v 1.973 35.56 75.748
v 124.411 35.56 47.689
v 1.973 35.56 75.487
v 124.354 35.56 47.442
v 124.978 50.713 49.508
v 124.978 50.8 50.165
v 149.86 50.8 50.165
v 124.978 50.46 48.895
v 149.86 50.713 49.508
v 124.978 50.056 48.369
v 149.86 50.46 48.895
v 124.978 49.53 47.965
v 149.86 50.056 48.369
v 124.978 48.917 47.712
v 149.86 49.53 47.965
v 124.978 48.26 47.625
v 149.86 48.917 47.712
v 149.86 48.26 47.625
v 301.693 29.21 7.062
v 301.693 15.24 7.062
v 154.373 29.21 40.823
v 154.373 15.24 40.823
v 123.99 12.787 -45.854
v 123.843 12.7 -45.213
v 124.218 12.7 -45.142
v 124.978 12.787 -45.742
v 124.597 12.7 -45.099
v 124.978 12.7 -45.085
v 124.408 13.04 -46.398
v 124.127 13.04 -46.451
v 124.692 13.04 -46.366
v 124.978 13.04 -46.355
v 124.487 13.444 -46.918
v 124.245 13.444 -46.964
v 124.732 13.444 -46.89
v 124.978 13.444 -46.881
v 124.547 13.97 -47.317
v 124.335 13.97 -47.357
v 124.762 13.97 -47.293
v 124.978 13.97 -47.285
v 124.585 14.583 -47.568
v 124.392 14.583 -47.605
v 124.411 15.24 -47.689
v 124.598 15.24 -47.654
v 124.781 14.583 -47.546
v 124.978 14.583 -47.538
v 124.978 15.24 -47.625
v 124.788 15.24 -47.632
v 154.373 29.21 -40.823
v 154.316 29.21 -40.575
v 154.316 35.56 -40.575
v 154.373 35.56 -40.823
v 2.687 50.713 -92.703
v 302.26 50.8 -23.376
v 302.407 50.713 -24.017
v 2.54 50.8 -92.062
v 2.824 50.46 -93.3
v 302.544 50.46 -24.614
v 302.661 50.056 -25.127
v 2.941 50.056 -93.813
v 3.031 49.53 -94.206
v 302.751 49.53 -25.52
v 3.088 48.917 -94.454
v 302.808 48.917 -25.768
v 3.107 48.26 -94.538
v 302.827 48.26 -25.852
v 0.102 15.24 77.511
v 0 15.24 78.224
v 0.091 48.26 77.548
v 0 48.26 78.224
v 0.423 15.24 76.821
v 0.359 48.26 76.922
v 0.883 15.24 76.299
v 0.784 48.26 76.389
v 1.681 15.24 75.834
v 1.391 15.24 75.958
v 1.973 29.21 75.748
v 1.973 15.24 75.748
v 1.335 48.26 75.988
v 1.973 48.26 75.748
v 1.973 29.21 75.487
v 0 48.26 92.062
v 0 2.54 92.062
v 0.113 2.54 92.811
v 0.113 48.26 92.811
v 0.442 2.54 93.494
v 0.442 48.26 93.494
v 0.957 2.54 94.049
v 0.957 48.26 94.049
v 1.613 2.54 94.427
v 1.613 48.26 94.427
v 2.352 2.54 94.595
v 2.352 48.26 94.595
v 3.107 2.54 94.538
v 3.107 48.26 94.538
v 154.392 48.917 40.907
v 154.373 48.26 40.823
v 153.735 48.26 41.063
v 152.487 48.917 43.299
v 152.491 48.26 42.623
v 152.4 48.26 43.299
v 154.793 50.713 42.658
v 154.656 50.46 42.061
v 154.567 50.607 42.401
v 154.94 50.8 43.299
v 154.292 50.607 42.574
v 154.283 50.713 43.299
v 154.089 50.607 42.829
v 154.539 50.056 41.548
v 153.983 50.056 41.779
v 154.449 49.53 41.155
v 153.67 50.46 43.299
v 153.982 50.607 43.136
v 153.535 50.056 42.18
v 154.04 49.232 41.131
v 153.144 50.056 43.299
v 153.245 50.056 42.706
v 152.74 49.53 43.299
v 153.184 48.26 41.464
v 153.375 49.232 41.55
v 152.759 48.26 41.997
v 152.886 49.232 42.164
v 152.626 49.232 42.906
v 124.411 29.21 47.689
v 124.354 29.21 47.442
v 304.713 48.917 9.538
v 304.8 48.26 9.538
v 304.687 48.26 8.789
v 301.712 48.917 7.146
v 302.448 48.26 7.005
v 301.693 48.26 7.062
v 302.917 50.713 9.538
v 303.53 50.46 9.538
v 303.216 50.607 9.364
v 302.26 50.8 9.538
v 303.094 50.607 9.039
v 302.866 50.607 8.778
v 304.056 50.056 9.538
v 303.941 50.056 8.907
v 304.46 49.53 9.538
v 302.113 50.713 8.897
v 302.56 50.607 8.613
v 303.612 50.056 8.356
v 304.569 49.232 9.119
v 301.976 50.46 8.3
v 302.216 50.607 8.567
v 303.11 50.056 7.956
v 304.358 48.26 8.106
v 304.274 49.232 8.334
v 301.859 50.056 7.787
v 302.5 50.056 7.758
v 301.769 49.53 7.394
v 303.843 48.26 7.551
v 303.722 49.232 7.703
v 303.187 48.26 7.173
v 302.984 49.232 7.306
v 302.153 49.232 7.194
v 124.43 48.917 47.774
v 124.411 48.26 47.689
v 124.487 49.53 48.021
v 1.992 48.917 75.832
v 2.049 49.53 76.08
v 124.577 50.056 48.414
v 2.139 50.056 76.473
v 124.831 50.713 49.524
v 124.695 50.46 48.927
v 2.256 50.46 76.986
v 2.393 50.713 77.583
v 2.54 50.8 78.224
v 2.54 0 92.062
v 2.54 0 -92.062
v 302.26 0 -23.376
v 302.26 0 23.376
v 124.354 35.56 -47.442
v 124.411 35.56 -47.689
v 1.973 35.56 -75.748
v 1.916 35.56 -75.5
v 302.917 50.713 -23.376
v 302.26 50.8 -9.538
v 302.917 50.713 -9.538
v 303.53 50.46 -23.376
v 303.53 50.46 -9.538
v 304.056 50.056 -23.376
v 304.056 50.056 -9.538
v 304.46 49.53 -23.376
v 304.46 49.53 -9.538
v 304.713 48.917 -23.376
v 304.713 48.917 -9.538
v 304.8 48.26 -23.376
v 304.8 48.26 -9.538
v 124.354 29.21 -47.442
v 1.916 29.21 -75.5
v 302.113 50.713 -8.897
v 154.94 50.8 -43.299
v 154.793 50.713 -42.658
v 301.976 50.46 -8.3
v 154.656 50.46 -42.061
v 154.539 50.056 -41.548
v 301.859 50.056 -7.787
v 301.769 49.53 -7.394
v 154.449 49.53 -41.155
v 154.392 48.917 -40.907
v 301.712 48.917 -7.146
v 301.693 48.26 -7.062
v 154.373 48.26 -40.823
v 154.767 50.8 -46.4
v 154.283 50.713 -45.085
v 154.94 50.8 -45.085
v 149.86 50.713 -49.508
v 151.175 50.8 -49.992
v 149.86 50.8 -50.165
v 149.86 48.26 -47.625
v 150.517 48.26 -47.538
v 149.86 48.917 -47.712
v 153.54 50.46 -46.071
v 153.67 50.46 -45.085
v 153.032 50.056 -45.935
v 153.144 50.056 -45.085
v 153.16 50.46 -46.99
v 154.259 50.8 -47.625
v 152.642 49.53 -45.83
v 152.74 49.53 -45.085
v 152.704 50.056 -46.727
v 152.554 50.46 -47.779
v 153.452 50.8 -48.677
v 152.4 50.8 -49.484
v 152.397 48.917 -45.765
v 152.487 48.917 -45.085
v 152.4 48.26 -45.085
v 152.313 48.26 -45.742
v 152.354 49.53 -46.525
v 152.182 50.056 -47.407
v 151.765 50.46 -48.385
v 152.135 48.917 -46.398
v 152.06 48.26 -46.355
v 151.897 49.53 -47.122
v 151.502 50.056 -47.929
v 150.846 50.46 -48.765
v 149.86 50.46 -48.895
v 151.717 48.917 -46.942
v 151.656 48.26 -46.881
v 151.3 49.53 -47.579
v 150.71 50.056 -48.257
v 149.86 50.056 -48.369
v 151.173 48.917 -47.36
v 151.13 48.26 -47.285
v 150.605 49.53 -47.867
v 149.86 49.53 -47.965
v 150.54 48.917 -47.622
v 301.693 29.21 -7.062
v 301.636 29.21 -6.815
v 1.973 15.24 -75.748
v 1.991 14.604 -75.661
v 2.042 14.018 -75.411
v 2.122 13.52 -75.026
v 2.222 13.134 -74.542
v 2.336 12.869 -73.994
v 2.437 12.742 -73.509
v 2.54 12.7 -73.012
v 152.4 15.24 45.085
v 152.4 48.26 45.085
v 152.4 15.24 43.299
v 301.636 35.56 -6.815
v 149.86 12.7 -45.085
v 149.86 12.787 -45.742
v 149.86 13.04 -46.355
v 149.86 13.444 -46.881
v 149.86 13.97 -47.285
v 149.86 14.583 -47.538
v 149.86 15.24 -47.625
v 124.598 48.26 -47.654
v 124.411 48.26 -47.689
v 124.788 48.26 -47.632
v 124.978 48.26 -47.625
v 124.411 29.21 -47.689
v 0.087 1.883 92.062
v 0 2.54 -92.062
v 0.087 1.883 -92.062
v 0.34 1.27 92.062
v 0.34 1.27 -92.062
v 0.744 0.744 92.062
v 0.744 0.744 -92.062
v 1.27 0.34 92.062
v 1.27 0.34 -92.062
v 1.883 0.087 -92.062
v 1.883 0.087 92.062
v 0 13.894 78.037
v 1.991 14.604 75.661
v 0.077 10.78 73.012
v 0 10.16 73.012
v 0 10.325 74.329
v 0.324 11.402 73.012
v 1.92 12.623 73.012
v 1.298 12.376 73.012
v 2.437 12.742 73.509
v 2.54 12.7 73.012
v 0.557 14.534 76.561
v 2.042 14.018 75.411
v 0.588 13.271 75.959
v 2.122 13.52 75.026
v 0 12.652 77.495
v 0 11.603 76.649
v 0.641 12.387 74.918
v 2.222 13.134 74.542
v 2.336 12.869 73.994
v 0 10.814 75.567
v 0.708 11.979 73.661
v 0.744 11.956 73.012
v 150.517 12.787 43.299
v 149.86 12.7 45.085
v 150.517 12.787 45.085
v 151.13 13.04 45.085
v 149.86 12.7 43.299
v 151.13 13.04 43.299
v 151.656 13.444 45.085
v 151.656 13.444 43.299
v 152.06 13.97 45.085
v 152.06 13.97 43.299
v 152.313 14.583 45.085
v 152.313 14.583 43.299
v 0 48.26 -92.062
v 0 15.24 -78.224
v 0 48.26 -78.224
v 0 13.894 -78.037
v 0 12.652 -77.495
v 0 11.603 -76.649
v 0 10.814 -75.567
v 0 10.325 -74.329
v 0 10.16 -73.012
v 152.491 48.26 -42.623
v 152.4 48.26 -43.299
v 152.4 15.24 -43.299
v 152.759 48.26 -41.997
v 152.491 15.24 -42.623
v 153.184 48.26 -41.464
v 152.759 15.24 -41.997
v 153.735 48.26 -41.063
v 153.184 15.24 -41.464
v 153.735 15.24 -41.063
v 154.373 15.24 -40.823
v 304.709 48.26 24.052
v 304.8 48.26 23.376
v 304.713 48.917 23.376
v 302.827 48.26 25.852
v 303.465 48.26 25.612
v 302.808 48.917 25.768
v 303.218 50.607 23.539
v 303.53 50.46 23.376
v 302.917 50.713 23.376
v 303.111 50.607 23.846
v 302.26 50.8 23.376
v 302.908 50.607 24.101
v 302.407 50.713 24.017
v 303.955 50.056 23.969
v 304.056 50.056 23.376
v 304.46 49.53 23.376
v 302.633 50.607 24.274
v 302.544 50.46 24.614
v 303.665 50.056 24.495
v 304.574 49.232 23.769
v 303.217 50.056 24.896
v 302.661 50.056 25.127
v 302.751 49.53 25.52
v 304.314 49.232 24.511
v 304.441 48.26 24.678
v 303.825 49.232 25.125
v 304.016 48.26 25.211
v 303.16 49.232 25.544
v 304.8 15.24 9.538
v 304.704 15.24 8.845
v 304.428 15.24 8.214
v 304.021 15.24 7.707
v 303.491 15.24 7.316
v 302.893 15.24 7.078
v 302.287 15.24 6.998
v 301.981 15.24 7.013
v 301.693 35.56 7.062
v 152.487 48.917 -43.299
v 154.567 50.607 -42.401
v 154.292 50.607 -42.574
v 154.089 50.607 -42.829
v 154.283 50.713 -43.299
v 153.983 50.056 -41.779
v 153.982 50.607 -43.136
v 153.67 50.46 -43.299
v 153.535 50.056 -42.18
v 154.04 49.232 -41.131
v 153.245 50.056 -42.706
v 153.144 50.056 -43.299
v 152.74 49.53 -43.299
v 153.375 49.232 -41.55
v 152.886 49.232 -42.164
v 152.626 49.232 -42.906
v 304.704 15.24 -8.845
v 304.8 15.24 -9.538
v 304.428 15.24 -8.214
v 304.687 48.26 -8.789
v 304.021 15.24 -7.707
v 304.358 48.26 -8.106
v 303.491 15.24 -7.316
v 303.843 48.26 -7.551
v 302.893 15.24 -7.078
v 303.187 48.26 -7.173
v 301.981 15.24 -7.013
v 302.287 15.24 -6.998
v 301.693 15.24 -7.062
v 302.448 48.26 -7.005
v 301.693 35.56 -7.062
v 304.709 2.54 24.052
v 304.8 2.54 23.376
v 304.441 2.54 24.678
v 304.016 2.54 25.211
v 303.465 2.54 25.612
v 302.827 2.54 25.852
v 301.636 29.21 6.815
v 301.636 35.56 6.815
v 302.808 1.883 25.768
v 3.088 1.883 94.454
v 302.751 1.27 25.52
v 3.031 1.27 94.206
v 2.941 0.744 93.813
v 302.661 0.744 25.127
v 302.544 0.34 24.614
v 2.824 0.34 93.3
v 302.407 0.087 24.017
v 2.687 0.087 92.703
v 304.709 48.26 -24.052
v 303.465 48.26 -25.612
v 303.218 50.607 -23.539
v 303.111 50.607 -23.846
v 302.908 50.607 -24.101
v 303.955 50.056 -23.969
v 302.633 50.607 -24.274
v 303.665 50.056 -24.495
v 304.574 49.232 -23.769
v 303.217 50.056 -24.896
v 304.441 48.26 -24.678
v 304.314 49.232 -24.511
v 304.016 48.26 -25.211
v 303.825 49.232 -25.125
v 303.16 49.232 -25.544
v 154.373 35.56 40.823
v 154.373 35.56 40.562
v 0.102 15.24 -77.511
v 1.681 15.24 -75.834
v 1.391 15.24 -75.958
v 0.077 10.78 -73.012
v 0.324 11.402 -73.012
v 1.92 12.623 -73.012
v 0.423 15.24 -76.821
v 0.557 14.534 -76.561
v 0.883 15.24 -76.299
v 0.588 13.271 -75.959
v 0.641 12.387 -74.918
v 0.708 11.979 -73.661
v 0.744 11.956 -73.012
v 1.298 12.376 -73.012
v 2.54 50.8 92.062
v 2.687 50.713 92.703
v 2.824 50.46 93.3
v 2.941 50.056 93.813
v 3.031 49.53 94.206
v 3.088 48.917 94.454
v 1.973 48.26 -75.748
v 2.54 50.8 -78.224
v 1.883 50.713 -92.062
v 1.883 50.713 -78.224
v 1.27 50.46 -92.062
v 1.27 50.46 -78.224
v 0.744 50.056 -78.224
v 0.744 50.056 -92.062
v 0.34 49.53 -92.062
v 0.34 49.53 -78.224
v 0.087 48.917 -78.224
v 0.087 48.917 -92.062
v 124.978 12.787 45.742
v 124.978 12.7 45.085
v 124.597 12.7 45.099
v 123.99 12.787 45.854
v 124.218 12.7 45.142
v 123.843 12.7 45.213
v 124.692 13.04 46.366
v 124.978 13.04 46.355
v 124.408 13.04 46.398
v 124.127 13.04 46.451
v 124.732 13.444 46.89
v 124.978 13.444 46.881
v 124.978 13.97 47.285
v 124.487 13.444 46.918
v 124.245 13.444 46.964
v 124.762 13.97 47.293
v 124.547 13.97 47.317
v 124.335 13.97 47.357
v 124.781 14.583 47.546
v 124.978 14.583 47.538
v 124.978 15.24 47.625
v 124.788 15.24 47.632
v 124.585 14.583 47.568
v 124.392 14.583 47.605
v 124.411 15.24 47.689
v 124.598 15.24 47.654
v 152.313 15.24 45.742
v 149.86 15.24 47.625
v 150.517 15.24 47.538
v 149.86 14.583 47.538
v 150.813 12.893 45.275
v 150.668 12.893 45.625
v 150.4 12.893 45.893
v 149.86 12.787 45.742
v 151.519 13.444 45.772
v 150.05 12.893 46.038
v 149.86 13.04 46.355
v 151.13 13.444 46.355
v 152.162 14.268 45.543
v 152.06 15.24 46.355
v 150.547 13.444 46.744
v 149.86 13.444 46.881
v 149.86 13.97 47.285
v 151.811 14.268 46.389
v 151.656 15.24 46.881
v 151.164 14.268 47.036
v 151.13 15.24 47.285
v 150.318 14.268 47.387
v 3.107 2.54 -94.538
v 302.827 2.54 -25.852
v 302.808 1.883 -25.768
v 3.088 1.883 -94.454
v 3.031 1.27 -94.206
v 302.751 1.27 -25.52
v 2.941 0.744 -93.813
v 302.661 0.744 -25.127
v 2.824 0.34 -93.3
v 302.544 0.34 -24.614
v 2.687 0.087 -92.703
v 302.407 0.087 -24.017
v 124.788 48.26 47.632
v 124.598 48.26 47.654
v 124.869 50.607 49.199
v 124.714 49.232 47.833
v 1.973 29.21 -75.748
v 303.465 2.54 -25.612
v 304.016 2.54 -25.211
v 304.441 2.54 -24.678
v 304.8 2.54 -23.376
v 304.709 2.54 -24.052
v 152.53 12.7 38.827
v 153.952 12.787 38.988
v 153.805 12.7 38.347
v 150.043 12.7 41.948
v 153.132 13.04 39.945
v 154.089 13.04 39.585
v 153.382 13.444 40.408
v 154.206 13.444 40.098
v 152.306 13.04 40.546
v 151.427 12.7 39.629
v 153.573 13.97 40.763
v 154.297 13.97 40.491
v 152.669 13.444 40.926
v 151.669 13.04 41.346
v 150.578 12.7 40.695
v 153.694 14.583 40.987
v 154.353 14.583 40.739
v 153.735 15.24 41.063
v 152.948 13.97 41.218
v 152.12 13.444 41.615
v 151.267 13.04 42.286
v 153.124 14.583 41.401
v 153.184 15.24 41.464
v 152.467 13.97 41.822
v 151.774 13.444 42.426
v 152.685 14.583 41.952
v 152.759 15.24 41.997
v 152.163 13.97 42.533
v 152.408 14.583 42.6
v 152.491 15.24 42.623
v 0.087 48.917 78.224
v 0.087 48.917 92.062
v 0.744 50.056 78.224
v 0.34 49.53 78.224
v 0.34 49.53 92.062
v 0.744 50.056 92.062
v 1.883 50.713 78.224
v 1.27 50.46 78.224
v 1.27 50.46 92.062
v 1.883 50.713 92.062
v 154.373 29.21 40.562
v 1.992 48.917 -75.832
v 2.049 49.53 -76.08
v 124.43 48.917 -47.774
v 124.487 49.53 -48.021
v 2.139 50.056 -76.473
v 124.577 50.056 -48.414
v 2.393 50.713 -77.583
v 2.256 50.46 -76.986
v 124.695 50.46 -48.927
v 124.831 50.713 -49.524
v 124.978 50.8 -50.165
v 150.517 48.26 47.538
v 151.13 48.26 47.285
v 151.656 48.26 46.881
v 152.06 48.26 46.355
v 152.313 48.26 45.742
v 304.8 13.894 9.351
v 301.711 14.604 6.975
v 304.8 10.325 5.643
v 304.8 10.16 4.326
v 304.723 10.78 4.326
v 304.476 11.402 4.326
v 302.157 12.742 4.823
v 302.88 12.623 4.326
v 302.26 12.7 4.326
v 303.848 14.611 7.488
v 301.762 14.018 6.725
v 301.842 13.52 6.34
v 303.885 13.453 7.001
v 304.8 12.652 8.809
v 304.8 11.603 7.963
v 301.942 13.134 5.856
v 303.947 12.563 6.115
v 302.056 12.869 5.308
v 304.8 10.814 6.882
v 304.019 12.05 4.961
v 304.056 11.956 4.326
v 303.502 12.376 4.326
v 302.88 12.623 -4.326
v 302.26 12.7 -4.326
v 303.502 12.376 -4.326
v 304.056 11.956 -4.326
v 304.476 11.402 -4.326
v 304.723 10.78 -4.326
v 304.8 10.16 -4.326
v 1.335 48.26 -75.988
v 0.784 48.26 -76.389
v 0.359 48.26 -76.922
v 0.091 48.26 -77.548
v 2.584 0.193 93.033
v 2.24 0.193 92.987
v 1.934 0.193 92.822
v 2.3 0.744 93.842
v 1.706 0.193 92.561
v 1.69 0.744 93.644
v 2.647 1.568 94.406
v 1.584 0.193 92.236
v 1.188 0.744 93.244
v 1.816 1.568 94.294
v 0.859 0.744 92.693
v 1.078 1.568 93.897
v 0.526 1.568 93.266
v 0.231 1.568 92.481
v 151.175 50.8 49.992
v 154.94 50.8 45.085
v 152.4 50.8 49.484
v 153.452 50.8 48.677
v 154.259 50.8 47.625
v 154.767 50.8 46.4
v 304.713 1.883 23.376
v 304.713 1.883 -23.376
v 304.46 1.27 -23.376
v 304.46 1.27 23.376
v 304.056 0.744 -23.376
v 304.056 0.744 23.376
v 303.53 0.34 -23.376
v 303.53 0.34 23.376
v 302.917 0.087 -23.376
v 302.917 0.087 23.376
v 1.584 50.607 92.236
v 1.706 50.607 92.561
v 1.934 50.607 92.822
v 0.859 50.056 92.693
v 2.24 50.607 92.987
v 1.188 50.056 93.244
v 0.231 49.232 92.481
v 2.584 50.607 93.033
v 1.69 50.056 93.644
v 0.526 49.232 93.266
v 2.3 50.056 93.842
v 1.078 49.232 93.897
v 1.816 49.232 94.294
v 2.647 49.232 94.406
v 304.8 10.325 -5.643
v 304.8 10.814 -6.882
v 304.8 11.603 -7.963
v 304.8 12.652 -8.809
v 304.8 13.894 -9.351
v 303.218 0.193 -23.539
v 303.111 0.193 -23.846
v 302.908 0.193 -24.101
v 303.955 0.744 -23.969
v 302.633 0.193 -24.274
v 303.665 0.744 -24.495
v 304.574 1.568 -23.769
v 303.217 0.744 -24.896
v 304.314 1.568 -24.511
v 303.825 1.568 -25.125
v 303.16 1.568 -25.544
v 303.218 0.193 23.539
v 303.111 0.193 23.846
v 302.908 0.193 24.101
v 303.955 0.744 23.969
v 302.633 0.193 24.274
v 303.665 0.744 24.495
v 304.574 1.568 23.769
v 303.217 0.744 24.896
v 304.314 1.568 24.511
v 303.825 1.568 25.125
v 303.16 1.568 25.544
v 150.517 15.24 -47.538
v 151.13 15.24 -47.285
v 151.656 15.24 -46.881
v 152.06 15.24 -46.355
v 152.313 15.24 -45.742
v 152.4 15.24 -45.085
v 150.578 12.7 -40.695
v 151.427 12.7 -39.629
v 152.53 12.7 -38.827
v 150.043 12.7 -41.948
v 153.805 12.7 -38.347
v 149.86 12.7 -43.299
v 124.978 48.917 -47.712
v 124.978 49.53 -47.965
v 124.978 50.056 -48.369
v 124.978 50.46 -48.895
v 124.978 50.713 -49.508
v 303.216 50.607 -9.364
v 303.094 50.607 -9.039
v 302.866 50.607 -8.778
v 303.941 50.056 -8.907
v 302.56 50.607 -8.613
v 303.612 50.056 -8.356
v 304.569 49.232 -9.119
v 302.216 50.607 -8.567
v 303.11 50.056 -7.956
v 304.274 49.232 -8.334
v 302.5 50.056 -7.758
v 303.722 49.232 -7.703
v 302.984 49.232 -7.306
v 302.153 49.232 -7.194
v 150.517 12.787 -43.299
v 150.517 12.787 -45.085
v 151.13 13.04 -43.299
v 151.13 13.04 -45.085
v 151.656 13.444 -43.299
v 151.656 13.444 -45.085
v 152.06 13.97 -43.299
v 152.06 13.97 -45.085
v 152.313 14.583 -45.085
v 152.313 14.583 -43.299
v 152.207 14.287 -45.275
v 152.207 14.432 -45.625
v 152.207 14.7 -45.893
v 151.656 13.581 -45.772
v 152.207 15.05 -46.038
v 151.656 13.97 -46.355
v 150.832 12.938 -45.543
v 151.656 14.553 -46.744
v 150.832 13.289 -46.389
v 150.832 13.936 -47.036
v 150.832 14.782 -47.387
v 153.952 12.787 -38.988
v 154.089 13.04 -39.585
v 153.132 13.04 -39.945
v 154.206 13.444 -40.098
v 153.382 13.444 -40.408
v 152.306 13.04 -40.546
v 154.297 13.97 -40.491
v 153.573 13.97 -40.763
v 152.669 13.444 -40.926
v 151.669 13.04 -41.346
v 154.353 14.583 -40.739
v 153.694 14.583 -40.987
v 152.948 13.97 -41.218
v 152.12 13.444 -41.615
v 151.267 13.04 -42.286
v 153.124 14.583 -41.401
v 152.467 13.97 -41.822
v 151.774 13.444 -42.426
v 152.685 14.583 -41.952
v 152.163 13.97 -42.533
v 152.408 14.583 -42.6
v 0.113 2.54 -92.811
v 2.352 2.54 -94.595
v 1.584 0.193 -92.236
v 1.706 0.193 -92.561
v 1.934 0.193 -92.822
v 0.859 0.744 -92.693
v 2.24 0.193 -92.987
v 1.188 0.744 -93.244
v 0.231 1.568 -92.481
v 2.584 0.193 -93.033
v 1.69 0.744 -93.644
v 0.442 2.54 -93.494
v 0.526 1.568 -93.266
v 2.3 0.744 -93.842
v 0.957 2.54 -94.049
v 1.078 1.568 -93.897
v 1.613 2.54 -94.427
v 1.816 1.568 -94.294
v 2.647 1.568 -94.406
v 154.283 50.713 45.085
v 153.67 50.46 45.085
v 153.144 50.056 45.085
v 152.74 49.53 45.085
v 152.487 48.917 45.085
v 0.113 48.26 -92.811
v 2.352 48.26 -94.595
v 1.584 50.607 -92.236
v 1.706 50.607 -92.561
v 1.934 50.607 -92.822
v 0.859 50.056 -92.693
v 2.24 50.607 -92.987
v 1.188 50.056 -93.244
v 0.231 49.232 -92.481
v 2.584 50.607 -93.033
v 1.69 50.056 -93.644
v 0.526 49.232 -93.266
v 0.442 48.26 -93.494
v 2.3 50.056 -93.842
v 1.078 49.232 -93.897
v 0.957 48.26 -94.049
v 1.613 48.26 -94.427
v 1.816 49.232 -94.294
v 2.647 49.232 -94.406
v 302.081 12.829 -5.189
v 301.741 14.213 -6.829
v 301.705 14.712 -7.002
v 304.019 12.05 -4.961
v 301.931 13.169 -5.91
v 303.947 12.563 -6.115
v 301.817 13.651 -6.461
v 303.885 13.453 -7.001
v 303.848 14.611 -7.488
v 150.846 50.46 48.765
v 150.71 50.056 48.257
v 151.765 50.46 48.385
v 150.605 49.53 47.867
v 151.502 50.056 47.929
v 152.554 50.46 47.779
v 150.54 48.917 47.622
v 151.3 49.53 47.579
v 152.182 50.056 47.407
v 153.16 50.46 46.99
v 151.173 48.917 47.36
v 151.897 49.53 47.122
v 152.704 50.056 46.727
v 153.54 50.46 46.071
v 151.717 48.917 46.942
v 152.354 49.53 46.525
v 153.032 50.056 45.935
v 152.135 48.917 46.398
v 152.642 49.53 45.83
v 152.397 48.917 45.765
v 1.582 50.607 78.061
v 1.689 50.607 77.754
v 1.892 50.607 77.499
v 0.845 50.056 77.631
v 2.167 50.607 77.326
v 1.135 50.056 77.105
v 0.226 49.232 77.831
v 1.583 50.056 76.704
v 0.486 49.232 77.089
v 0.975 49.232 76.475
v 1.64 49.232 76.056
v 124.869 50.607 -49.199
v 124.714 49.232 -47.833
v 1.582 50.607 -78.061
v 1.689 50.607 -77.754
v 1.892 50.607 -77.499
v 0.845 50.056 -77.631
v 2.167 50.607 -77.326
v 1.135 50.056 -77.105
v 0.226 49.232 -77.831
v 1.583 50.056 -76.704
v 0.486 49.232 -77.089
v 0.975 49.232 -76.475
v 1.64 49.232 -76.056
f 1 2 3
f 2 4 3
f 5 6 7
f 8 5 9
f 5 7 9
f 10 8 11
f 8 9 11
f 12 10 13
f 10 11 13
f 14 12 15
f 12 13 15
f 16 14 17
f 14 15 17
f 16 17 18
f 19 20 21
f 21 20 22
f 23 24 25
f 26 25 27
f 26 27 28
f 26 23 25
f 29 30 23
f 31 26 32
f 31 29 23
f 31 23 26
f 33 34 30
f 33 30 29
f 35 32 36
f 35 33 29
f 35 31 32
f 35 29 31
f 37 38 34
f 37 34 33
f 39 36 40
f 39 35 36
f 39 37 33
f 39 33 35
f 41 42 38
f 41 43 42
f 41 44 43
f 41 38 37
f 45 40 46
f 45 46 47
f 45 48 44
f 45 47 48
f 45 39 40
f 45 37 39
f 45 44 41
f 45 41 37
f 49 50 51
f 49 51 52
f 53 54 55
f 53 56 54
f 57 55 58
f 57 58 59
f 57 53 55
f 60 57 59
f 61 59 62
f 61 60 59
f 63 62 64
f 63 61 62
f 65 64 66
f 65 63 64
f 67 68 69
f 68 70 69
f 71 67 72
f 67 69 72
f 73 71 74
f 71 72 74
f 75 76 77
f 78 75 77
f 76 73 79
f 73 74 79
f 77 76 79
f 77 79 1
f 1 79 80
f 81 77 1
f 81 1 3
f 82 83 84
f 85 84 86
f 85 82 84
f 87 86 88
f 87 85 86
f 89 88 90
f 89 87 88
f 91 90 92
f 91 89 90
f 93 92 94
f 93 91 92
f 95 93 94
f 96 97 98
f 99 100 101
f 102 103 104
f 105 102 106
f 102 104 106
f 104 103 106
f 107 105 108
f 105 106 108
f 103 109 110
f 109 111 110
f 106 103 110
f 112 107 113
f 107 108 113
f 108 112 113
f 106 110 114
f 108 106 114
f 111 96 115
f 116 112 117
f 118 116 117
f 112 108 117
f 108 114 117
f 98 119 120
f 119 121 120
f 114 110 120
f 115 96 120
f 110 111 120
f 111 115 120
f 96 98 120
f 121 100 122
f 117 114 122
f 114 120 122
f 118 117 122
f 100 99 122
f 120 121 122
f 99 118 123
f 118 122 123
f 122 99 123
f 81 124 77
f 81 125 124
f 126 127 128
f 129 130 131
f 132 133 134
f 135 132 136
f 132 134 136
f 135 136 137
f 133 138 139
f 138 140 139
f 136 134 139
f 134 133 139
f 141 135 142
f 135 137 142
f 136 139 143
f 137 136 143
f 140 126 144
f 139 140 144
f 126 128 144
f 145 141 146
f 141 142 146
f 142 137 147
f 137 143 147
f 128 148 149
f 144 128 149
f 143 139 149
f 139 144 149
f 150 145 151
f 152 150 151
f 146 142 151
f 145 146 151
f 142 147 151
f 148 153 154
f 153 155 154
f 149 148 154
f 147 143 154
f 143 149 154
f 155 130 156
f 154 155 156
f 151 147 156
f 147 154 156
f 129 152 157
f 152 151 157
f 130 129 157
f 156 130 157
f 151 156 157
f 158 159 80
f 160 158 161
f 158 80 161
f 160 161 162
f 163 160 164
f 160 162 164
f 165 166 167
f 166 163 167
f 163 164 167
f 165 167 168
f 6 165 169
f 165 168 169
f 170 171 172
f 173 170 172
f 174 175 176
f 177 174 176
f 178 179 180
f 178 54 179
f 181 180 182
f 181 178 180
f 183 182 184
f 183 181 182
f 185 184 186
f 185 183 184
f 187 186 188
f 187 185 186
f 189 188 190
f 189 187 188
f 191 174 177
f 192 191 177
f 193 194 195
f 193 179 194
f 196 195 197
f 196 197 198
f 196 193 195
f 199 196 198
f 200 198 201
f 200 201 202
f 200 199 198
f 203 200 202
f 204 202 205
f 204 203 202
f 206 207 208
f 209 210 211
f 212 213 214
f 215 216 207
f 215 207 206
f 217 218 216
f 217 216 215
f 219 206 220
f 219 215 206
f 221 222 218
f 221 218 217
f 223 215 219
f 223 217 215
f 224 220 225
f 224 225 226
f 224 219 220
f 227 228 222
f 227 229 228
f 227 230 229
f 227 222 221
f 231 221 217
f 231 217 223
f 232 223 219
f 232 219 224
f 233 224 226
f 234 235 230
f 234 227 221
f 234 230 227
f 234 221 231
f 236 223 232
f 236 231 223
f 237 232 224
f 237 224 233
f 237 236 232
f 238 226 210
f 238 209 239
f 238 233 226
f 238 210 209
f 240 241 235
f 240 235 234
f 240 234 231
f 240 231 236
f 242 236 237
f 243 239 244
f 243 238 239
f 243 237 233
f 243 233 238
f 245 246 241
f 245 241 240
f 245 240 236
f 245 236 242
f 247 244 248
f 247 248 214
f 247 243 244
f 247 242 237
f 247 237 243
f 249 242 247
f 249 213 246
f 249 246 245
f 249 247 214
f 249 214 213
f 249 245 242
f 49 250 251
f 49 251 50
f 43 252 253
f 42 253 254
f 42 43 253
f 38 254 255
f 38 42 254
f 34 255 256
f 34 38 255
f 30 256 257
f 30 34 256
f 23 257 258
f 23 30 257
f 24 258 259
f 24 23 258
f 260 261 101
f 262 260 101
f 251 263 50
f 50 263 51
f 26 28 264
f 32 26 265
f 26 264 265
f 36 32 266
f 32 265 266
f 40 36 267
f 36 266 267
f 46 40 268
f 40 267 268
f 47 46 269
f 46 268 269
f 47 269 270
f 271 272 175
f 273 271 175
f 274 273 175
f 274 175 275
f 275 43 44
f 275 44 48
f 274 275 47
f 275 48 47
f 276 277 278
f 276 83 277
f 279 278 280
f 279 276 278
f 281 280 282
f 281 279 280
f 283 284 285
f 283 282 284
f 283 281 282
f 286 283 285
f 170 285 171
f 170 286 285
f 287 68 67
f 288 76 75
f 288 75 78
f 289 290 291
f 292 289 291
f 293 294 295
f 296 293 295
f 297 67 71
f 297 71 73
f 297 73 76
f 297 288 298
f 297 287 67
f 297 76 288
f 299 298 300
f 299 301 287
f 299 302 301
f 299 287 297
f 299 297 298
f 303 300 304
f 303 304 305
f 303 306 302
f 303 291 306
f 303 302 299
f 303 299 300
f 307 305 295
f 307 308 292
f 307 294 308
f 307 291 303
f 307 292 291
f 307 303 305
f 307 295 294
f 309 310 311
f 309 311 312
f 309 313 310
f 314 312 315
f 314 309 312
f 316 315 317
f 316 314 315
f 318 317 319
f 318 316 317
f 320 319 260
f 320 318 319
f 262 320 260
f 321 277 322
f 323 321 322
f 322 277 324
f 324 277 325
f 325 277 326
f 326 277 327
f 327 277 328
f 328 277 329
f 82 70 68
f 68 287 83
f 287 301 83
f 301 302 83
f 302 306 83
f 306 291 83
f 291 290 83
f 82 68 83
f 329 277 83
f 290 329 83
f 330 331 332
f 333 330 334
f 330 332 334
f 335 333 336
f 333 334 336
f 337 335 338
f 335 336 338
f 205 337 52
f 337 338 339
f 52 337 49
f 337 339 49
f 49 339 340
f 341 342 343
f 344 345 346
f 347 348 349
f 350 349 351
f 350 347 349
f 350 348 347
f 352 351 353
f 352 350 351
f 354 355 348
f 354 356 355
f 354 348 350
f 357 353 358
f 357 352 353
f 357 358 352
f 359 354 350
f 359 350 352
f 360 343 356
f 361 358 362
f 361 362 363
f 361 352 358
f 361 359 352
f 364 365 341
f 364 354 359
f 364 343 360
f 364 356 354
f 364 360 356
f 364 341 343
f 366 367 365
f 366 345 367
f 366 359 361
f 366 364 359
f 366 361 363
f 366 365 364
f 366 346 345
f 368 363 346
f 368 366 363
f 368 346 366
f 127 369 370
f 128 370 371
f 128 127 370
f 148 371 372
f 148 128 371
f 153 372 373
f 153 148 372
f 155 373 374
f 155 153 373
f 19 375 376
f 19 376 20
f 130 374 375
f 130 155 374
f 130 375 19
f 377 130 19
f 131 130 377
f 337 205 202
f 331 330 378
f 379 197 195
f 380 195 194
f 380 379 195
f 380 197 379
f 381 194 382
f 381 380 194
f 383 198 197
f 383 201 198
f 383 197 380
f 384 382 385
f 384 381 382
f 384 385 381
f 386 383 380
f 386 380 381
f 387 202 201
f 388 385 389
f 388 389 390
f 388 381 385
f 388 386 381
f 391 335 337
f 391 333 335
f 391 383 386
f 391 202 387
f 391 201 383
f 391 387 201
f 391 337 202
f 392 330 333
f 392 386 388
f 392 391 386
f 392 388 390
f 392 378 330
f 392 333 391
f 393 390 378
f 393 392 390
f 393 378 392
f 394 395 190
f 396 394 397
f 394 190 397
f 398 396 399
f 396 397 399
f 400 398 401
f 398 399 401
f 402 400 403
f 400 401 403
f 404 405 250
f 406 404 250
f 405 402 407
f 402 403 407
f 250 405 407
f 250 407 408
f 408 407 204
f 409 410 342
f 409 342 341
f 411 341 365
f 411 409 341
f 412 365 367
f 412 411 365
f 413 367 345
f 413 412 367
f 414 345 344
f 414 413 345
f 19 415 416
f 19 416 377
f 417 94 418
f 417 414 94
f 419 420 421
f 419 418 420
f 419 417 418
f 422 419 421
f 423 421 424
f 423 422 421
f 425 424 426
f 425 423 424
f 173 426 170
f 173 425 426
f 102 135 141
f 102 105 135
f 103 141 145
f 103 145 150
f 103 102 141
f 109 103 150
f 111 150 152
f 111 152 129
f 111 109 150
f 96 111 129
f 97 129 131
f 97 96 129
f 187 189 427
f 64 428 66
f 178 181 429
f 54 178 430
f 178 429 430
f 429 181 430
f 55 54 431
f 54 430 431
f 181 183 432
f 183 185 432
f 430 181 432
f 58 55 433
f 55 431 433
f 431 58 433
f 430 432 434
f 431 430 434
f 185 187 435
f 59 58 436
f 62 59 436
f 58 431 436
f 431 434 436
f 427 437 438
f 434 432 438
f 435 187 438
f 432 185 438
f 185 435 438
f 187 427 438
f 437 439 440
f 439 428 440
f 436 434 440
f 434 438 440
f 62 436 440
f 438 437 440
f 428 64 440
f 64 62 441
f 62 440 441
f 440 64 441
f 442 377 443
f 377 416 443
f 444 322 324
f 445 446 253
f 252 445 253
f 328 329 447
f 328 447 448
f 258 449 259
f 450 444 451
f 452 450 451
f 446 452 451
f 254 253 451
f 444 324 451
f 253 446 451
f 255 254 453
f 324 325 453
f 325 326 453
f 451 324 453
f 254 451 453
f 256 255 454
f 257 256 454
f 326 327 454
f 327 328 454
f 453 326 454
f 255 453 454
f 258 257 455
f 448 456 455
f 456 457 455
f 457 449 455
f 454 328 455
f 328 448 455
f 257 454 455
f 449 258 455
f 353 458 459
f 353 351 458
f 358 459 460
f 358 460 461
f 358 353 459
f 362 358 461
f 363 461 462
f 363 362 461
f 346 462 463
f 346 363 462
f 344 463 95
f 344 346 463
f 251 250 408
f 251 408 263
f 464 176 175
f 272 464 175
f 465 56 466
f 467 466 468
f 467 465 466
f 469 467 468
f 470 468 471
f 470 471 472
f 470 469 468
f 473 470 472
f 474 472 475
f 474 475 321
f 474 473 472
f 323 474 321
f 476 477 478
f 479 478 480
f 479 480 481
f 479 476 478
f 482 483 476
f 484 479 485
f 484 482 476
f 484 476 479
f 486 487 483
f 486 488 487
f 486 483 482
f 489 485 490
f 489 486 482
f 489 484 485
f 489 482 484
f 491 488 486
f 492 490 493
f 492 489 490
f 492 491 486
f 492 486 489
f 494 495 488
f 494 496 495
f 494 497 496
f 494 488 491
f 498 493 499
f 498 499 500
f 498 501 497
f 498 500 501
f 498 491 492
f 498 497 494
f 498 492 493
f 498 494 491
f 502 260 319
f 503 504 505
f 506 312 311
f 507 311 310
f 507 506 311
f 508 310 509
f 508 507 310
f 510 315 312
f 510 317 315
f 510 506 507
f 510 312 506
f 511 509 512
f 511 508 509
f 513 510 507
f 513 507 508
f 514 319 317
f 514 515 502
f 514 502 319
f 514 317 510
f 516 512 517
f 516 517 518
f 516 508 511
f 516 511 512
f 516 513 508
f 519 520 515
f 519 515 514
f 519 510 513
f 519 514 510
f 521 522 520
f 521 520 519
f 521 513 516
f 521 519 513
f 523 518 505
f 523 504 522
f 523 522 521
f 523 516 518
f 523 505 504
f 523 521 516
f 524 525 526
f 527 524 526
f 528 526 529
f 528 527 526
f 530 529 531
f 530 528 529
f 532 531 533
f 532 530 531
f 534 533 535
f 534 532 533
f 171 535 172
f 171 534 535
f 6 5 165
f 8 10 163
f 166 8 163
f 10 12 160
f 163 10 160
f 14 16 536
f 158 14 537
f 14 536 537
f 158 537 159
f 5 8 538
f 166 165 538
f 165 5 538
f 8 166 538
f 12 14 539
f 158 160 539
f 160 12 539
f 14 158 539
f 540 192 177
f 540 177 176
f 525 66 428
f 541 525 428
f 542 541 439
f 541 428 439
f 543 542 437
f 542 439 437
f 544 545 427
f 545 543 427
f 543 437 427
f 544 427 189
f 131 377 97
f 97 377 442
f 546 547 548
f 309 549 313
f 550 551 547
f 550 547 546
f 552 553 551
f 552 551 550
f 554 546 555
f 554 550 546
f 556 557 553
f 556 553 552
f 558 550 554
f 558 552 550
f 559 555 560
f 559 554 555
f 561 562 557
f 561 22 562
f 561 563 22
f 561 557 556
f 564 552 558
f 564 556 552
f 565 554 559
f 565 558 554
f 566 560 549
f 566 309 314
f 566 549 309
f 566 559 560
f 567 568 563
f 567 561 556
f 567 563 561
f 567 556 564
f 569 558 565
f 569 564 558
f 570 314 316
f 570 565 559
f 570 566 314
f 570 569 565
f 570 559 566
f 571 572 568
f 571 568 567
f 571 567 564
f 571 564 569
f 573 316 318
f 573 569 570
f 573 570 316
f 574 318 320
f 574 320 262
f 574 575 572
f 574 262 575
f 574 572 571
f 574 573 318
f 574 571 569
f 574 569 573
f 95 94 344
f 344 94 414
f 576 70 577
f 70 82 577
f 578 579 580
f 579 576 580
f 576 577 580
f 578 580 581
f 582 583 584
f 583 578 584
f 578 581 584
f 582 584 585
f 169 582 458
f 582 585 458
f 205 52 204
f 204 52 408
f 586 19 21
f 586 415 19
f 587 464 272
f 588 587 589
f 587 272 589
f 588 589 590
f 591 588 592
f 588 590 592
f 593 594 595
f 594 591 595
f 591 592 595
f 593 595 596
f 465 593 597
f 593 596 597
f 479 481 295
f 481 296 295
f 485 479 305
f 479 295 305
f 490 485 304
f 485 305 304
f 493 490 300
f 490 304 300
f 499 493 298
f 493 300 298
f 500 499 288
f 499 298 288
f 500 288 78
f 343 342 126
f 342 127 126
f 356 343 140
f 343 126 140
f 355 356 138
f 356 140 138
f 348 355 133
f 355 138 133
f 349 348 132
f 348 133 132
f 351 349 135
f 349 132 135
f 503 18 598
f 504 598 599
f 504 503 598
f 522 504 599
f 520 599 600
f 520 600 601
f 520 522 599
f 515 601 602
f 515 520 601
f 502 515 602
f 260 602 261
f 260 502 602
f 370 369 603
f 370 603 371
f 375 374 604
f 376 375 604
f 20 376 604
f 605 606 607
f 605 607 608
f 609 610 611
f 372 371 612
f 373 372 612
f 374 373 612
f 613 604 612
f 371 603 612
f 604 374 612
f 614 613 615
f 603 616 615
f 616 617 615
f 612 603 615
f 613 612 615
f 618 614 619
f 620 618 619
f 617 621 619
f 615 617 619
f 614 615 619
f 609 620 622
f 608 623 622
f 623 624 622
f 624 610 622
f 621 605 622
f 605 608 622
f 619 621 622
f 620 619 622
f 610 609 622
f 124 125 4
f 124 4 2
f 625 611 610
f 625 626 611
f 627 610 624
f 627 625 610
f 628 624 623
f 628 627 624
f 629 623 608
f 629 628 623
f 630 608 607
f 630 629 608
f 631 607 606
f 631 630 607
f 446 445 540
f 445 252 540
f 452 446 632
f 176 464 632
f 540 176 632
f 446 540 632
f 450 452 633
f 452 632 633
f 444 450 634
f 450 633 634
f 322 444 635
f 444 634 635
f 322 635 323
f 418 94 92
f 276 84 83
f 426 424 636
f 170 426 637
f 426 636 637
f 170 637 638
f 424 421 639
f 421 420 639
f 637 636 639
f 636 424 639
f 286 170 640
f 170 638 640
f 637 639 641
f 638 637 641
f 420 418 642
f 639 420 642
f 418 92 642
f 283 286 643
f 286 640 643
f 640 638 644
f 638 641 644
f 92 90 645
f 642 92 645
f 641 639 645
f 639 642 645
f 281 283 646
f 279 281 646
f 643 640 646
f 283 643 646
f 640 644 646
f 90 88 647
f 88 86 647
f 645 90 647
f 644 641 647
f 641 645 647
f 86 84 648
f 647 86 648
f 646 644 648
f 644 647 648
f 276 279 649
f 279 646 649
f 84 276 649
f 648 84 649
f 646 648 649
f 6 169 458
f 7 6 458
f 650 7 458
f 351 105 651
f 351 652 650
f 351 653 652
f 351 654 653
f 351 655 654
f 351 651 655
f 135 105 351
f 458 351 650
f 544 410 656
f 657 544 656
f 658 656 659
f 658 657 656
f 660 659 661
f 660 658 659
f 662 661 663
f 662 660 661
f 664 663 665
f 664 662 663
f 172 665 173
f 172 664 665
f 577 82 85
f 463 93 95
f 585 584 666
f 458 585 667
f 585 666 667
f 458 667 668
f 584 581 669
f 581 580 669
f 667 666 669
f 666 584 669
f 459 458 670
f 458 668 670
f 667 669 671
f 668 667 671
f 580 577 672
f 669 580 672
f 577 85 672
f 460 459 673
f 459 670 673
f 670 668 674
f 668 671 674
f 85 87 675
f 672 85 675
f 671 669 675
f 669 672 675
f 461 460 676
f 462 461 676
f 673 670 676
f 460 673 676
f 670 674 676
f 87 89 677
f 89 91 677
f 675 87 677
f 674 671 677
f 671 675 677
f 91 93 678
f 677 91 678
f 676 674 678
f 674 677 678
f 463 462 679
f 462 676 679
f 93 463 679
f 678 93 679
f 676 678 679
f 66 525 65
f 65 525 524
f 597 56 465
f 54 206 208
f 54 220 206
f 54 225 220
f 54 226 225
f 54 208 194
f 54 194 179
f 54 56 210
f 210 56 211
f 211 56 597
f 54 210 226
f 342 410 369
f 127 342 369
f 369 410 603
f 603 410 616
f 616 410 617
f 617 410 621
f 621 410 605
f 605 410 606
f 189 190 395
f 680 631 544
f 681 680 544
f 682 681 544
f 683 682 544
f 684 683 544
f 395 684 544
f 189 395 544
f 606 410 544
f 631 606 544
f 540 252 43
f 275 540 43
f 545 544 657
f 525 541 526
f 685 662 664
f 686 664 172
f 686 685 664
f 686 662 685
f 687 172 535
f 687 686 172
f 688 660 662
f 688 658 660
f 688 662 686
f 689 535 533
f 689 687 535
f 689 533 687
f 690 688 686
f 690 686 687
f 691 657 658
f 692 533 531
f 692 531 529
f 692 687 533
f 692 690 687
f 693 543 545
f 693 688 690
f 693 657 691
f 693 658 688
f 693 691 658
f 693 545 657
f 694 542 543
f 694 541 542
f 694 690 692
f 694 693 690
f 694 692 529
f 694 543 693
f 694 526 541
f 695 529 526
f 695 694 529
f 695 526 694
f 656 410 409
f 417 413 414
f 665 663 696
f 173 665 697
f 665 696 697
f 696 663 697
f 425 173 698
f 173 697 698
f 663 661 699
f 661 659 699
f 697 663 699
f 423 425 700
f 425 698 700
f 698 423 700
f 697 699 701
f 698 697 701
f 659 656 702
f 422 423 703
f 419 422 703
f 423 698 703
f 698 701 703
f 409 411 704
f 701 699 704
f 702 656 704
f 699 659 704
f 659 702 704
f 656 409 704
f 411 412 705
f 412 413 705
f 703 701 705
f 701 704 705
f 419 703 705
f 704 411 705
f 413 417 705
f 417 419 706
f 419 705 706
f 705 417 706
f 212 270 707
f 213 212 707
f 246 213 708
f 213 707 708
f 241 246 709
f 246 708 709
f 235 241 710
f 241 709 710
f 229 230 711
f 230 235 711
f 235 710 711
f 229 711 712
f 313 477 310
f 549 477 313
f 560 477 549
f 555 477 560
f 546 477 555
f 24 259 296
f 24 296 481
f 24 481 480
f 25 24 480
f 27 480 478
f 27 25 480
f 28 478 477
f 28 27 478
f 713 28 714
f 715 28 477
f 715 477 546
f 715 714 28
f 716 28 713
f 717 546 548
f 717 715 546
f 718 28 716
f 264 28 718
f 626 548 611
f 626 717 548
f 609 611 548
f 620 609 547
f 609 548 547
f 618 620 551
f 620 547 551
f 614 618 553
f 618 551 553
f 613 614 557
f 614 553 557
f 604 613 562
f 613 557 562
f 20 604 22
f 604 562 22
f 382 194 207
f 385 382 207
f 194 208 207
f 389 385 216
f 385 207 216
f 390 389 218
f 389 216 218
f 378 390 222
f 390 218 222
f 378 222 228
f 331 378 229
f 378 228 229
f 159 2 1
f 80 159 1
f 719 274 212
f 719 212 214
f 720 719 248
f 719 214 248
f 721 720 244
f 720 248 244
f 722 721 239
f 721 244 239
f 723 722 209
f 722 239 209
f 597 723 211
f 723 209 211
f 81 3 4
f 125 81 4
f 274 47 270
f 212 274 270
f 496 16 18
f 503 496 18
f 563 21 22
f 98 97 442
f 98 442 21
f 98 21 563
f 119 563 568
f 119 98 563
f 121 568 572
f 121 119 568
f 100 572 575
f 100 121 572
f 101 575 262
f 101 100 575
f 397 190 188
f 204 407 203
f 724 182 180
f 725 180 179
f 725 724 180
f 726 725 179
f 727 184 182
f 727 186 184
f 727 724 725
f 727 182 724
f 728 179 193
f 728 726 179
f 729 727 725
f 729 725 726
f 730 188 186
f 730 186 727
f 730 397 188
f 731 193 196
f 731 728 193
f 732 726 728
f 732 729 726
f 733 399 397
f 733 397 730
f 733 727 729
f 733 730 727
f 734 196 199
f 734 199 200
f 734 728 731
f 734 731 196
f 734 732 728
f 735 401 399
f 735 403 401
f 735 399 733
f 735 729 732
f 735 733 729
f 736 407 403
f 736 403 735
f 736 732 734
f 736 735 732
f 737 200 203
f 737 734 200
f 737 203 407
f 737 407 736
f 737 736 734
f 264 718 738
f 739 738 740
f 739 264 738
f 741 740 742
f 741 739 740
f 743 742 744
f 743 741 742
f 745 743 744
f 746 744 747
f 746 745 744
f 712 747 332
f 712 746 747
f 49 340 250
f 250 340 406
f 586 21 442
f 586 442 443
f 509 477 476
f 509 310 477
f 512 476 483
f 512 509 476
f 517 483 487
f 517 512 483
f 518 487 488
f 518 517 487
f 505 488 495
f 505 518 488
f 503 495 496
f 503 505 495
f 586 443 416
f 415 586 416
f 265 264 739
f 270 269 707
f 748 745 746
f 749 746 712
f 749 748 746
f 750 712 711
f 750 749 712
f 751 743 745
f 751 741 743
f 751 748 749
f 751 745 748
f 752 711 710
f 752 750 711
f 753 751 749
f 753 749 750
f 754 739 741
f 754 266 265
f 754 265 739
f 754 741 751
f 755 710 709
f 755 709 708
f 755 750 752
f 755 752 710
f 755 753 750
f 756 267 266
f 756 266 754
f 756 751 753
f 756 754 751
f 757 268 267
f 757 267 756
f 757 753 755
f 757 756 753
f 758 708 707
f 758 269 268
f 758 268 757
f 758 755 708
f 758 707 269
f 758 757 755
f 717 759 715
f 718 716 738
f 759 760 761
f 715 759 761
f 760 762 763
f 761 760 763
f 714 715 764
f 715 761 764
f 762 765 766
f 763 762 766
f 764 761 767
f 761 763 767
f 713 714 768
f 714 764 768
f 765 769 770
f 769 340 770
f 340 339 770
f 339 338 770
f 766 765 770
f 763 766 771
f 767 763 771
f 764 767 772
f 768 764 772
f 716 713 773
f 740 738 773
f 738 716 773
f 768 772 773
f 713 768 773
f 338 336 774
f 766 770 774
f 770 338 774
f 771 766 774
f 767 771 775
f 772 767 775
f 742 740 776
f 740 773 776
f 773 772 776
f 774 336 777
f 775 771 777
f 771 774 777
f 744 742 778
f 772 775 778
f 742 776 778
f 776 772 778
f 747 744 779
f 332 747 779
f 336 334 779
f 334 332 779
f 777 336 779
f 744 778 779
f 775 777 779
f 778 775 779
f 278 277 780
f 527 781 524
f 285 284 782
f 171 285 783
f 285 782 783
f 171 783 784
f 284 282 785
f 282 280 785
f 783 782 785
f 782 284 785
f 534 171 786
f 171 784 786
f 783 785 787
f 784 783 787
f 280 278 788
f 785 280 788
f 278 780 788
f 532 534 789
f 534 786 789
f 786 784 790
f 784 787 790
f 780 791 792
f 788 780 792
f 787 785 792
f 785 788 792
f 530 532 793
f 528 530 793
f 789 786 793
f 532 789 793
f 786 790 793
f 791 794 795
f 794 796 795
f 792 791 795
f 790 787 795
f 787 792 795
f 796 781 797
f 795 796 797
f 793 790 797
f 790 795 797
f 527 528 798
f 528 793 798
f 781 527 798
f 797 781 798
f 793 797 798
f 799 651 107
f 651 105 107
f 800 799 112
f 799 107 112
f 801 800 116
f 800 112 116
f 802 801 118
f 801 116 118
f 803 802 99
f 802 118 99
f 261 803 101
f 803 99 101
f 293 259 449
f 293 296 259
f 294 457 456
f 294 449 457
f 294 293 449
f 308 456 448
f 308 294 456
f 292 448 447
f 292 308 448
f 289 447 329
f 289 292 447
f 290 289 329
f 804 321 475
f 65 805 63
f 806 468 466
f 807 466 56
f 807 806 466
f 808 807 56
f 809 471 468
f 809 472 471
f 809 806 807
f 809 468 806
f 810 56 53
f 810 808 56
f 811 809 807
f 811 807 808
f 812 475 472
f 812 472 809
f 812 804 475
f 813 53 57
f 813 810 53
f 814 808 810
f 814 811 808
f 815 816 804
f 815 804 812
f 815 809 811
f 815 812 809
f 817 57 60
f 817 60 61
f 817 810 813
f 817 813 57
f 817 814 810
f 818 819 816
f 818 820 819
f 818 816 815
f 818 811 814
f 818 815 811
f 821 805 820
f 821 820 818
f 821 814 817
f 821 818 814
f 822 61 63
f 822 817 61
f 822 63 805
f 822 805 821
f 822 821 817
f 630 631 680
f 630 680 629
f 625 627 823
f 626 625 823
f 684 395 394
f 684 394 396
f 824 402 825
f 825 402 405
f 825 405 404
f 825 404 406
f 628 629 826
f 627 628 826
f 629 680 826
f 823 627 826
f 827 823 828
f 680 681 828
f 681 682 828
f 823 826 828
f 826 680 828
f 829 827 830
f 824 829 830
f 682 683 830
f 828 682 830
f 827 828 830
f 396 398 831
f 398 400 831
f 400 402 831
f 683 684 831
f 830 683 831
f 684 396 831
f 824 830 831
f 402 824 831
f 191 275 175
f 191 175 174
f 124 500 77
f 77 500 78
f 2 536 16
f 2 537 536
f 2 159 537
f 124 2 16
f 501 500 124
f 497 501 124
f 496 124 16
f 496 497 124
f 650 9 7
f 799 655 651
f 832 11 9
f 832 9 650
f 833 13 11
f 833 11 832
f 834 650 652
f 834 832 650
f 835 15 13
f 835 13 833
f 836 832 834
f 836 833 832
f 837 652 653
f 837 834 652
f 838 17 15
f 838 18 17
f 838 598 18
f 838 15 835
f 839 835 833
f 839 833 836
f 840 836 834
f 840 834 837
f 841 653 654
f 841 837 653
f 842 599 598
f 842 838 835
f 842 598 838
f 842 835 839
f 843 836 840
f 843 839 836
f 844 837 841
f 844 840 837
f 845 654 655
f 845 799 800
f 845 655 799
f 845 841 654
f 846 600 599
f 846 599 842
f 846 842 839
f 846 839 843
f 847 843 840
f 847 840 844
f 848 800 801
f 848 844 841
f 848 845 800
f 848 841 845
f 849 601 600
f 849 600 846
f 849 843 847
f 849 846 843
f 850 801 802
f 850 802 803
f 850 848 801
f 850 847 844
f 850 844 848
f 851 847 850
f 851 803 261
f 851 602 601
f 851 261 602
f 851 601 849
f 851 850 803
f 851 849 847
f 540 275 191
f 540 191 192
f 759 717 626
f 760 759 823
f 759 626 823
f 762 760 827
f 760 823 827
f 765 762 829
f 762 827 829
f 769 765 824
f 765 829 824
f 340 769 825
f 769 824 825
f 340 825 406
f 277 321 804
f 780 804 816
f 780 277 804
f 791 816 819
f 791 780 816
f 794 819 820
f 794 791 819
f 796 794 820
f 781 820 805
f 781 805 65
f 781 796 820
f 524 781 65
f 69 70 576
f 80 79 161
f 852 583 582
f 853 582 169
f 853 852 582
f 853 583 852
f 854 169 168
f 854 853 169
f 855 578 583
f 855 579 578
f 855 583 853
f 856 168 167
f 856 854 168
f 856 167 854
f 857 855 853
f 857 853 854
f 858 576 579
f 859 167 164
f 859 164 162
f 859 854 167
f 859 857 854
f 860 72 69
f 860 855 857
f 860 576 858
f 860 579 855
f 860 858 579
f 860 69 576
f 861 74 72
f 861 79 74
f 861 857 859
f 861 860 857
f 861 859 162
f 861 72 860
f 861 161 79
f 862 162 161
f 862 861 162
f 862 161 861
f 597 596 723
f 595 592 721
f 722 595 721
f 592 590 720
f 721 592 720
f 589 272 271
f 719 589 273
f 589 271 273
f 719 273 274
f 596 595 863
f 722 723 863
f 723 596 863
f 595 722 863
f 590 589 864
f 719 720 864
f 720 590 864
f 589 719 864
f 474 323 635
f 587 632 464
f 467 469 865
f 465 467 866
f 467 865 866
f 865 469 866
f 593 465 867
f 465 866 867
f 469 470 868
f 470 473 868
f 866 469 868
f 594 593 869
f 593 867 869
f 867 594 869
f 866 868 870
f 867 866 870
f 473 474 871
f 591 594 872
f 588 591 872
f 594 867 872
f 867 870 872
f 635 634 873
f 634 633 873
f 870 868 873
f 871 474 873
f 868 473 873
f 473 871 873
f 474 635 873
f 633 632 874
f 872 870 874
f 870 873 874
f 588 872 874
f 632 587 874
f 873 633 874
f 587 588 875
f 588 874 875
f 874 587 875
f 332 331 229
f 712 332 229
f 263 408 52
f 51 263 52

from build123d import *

# Parameters (mm, degrees)
BOSS_EXTRUDE1_DEPTH = 12.7
BOSS_EXTRUDE2_DEPTH = 38.1
SKETCH3_W           = 48.711101319
SKETCH3_H           = 95.25
CUT_EXTRUDE1_DEPTH  = 38.1
FILLET1_R           = 2.54
BOSS_EXTRUDE3_DEPTH = 6.35


with BuildPart() as part:
    # Sketch1 → Boss-Extrude1 (new body)
    with BuildSketch(Plane(origin=(0, 0, 0), x_dir=(1, 0, 0), z_dir=(0, 1, 0))):
        Polygon((0, 95.25), (0, -95.25), (304.8, -25.4), (304.8, 25.4), align=None)
    extrude(amount=BOSS_EXTRUDE1_DEPTH)

    # Sketch2 → Boss-Extrude2 (add)
    with BuildSketch(Plane(origin=(0, 12.7, 0), x_dir=(1, 0, 0), z_dir=(0, 1, 0))):
        Polygon((0, 76.2), (304.8, 6.35), (304.8, 25.4), (0, 95.25), align=None)
        Polygon((304.8, -6.35), (0, -76.2), (0, -95.25), (304.8, -25.4), align=None)
    extrude(amount=BOSS_EXTRUDE2_DEPTH)

    # Sketch3 → Cut-Extrude1 (cut)
    with BuildSketch(Plane(origin=(0, 50.8, 0), x_dir=(1, 0, 0), z_dir=(0, 1, 0))):
        with Locations((128.044449341, 0)):
            Rectangle(SKETCH3_W, SKETCH3_H)
    extrude(amount=-CUT_EXTRUDE1_DEPTH, mode=Mode.SUBTRACT)

    # Fillet1
    fillet1_edges = [part.edges().sort_by_distance(p)[0] for p in [
        (304.8, 12.7, 0),
        (228.6, 12.7, 23.8125),
        (304.8, 31.75, 6.35),
        (0, 31.75, 76.2),
        (304.8, 50.8, 15.875),
        (228.6, 50.8, 23.8125),
        (0, 50.8, 85.725),
        (152.4, 50.8, 60.325),
        (0, 12.7, 0),
        (62.345454545, 12.7, -61.9125),
        (0, 31.75, -76.2),
        (304.8, 31.75, -6.35),
        (0, 50.8, -85.725),
        (62.345454545, 50.8, -61.9125),
        (304.8, 50.8, -15.875),
        (152.4, 50.8, -60.325),
        (228.6, 50.8, -23.8125),
        (152.4, 50.8, -44.45),
        (228.6, 12.7, -23.8125),
        (62.345454545, 50.8, 61.9125),
        (62.345454545, 12.7, 61.9125),
        (124.690909091, 31.75, 47.625),
        (152.4, 31.75, 47.625),
        (138.545454545, 50.8, 47.625),
        (152.4, 50.8, 44.45),
        (138.545454545, 50.8, -47.625),
        (152.4, 12.7, 44.45),
        (138.545454545, 12.7, 47.625),
        (138.545454545, 12.7, -47.625),
        (152.4, 12.7, -44.45),
        (152.4, 31.75, 41.275),
        (152.4, 31.75, -41.275),
        (152.4, 31.75, -47.625),
        (124.690909091, 31.75, -47.625),
        (304.8, 0, 0),
        (152.4, 0, 60.325),
        (0, 0, 0),
        (152.4, 0, -60.325),
        (304.8, 25.4, -25.4),
        (304.8, 25.4, 25.4),
        (0, 25.4, 95.25),
        (0, 25.4, -95.25),
    ]]
    fillet(fillet1_edges, radius=FILLET1_R)

    # Sketch4 → Boss-Extrude3 (add)
    with BuildSketch(Plane(origin=(0, 35.56, 0), x_dir=(1, 0, 0), z_dir=(0, 1, 0))):
        Polygon((301.692624563, -7.062106871), (154.372624563, -40.822940204), (154.372624563, -40.562355842), (301.635887019, -6.814524862), align=None)
        Polygon((124.410851298, -47.689179911), (1.972624563, -75.747940204), (1.972624563, -75.487355842), (124.354113754, -47.441597902), align=None)
        Polygon((154.372624563, 40.822940204), (301.692624563, 7.062106871), (301.635887019, 6.814524862), (154.315887019, 40.575358195), align=None)
        Polygon((1.972624563, 75.747940204), (124.410851298, 47.689179911), (124.354113754, 47.441597902), (1.915887019, 75.500358195), align=None)
    extrude(amount=-BOSS_EXTRUDE3_DEPTH)


solid = part.part
